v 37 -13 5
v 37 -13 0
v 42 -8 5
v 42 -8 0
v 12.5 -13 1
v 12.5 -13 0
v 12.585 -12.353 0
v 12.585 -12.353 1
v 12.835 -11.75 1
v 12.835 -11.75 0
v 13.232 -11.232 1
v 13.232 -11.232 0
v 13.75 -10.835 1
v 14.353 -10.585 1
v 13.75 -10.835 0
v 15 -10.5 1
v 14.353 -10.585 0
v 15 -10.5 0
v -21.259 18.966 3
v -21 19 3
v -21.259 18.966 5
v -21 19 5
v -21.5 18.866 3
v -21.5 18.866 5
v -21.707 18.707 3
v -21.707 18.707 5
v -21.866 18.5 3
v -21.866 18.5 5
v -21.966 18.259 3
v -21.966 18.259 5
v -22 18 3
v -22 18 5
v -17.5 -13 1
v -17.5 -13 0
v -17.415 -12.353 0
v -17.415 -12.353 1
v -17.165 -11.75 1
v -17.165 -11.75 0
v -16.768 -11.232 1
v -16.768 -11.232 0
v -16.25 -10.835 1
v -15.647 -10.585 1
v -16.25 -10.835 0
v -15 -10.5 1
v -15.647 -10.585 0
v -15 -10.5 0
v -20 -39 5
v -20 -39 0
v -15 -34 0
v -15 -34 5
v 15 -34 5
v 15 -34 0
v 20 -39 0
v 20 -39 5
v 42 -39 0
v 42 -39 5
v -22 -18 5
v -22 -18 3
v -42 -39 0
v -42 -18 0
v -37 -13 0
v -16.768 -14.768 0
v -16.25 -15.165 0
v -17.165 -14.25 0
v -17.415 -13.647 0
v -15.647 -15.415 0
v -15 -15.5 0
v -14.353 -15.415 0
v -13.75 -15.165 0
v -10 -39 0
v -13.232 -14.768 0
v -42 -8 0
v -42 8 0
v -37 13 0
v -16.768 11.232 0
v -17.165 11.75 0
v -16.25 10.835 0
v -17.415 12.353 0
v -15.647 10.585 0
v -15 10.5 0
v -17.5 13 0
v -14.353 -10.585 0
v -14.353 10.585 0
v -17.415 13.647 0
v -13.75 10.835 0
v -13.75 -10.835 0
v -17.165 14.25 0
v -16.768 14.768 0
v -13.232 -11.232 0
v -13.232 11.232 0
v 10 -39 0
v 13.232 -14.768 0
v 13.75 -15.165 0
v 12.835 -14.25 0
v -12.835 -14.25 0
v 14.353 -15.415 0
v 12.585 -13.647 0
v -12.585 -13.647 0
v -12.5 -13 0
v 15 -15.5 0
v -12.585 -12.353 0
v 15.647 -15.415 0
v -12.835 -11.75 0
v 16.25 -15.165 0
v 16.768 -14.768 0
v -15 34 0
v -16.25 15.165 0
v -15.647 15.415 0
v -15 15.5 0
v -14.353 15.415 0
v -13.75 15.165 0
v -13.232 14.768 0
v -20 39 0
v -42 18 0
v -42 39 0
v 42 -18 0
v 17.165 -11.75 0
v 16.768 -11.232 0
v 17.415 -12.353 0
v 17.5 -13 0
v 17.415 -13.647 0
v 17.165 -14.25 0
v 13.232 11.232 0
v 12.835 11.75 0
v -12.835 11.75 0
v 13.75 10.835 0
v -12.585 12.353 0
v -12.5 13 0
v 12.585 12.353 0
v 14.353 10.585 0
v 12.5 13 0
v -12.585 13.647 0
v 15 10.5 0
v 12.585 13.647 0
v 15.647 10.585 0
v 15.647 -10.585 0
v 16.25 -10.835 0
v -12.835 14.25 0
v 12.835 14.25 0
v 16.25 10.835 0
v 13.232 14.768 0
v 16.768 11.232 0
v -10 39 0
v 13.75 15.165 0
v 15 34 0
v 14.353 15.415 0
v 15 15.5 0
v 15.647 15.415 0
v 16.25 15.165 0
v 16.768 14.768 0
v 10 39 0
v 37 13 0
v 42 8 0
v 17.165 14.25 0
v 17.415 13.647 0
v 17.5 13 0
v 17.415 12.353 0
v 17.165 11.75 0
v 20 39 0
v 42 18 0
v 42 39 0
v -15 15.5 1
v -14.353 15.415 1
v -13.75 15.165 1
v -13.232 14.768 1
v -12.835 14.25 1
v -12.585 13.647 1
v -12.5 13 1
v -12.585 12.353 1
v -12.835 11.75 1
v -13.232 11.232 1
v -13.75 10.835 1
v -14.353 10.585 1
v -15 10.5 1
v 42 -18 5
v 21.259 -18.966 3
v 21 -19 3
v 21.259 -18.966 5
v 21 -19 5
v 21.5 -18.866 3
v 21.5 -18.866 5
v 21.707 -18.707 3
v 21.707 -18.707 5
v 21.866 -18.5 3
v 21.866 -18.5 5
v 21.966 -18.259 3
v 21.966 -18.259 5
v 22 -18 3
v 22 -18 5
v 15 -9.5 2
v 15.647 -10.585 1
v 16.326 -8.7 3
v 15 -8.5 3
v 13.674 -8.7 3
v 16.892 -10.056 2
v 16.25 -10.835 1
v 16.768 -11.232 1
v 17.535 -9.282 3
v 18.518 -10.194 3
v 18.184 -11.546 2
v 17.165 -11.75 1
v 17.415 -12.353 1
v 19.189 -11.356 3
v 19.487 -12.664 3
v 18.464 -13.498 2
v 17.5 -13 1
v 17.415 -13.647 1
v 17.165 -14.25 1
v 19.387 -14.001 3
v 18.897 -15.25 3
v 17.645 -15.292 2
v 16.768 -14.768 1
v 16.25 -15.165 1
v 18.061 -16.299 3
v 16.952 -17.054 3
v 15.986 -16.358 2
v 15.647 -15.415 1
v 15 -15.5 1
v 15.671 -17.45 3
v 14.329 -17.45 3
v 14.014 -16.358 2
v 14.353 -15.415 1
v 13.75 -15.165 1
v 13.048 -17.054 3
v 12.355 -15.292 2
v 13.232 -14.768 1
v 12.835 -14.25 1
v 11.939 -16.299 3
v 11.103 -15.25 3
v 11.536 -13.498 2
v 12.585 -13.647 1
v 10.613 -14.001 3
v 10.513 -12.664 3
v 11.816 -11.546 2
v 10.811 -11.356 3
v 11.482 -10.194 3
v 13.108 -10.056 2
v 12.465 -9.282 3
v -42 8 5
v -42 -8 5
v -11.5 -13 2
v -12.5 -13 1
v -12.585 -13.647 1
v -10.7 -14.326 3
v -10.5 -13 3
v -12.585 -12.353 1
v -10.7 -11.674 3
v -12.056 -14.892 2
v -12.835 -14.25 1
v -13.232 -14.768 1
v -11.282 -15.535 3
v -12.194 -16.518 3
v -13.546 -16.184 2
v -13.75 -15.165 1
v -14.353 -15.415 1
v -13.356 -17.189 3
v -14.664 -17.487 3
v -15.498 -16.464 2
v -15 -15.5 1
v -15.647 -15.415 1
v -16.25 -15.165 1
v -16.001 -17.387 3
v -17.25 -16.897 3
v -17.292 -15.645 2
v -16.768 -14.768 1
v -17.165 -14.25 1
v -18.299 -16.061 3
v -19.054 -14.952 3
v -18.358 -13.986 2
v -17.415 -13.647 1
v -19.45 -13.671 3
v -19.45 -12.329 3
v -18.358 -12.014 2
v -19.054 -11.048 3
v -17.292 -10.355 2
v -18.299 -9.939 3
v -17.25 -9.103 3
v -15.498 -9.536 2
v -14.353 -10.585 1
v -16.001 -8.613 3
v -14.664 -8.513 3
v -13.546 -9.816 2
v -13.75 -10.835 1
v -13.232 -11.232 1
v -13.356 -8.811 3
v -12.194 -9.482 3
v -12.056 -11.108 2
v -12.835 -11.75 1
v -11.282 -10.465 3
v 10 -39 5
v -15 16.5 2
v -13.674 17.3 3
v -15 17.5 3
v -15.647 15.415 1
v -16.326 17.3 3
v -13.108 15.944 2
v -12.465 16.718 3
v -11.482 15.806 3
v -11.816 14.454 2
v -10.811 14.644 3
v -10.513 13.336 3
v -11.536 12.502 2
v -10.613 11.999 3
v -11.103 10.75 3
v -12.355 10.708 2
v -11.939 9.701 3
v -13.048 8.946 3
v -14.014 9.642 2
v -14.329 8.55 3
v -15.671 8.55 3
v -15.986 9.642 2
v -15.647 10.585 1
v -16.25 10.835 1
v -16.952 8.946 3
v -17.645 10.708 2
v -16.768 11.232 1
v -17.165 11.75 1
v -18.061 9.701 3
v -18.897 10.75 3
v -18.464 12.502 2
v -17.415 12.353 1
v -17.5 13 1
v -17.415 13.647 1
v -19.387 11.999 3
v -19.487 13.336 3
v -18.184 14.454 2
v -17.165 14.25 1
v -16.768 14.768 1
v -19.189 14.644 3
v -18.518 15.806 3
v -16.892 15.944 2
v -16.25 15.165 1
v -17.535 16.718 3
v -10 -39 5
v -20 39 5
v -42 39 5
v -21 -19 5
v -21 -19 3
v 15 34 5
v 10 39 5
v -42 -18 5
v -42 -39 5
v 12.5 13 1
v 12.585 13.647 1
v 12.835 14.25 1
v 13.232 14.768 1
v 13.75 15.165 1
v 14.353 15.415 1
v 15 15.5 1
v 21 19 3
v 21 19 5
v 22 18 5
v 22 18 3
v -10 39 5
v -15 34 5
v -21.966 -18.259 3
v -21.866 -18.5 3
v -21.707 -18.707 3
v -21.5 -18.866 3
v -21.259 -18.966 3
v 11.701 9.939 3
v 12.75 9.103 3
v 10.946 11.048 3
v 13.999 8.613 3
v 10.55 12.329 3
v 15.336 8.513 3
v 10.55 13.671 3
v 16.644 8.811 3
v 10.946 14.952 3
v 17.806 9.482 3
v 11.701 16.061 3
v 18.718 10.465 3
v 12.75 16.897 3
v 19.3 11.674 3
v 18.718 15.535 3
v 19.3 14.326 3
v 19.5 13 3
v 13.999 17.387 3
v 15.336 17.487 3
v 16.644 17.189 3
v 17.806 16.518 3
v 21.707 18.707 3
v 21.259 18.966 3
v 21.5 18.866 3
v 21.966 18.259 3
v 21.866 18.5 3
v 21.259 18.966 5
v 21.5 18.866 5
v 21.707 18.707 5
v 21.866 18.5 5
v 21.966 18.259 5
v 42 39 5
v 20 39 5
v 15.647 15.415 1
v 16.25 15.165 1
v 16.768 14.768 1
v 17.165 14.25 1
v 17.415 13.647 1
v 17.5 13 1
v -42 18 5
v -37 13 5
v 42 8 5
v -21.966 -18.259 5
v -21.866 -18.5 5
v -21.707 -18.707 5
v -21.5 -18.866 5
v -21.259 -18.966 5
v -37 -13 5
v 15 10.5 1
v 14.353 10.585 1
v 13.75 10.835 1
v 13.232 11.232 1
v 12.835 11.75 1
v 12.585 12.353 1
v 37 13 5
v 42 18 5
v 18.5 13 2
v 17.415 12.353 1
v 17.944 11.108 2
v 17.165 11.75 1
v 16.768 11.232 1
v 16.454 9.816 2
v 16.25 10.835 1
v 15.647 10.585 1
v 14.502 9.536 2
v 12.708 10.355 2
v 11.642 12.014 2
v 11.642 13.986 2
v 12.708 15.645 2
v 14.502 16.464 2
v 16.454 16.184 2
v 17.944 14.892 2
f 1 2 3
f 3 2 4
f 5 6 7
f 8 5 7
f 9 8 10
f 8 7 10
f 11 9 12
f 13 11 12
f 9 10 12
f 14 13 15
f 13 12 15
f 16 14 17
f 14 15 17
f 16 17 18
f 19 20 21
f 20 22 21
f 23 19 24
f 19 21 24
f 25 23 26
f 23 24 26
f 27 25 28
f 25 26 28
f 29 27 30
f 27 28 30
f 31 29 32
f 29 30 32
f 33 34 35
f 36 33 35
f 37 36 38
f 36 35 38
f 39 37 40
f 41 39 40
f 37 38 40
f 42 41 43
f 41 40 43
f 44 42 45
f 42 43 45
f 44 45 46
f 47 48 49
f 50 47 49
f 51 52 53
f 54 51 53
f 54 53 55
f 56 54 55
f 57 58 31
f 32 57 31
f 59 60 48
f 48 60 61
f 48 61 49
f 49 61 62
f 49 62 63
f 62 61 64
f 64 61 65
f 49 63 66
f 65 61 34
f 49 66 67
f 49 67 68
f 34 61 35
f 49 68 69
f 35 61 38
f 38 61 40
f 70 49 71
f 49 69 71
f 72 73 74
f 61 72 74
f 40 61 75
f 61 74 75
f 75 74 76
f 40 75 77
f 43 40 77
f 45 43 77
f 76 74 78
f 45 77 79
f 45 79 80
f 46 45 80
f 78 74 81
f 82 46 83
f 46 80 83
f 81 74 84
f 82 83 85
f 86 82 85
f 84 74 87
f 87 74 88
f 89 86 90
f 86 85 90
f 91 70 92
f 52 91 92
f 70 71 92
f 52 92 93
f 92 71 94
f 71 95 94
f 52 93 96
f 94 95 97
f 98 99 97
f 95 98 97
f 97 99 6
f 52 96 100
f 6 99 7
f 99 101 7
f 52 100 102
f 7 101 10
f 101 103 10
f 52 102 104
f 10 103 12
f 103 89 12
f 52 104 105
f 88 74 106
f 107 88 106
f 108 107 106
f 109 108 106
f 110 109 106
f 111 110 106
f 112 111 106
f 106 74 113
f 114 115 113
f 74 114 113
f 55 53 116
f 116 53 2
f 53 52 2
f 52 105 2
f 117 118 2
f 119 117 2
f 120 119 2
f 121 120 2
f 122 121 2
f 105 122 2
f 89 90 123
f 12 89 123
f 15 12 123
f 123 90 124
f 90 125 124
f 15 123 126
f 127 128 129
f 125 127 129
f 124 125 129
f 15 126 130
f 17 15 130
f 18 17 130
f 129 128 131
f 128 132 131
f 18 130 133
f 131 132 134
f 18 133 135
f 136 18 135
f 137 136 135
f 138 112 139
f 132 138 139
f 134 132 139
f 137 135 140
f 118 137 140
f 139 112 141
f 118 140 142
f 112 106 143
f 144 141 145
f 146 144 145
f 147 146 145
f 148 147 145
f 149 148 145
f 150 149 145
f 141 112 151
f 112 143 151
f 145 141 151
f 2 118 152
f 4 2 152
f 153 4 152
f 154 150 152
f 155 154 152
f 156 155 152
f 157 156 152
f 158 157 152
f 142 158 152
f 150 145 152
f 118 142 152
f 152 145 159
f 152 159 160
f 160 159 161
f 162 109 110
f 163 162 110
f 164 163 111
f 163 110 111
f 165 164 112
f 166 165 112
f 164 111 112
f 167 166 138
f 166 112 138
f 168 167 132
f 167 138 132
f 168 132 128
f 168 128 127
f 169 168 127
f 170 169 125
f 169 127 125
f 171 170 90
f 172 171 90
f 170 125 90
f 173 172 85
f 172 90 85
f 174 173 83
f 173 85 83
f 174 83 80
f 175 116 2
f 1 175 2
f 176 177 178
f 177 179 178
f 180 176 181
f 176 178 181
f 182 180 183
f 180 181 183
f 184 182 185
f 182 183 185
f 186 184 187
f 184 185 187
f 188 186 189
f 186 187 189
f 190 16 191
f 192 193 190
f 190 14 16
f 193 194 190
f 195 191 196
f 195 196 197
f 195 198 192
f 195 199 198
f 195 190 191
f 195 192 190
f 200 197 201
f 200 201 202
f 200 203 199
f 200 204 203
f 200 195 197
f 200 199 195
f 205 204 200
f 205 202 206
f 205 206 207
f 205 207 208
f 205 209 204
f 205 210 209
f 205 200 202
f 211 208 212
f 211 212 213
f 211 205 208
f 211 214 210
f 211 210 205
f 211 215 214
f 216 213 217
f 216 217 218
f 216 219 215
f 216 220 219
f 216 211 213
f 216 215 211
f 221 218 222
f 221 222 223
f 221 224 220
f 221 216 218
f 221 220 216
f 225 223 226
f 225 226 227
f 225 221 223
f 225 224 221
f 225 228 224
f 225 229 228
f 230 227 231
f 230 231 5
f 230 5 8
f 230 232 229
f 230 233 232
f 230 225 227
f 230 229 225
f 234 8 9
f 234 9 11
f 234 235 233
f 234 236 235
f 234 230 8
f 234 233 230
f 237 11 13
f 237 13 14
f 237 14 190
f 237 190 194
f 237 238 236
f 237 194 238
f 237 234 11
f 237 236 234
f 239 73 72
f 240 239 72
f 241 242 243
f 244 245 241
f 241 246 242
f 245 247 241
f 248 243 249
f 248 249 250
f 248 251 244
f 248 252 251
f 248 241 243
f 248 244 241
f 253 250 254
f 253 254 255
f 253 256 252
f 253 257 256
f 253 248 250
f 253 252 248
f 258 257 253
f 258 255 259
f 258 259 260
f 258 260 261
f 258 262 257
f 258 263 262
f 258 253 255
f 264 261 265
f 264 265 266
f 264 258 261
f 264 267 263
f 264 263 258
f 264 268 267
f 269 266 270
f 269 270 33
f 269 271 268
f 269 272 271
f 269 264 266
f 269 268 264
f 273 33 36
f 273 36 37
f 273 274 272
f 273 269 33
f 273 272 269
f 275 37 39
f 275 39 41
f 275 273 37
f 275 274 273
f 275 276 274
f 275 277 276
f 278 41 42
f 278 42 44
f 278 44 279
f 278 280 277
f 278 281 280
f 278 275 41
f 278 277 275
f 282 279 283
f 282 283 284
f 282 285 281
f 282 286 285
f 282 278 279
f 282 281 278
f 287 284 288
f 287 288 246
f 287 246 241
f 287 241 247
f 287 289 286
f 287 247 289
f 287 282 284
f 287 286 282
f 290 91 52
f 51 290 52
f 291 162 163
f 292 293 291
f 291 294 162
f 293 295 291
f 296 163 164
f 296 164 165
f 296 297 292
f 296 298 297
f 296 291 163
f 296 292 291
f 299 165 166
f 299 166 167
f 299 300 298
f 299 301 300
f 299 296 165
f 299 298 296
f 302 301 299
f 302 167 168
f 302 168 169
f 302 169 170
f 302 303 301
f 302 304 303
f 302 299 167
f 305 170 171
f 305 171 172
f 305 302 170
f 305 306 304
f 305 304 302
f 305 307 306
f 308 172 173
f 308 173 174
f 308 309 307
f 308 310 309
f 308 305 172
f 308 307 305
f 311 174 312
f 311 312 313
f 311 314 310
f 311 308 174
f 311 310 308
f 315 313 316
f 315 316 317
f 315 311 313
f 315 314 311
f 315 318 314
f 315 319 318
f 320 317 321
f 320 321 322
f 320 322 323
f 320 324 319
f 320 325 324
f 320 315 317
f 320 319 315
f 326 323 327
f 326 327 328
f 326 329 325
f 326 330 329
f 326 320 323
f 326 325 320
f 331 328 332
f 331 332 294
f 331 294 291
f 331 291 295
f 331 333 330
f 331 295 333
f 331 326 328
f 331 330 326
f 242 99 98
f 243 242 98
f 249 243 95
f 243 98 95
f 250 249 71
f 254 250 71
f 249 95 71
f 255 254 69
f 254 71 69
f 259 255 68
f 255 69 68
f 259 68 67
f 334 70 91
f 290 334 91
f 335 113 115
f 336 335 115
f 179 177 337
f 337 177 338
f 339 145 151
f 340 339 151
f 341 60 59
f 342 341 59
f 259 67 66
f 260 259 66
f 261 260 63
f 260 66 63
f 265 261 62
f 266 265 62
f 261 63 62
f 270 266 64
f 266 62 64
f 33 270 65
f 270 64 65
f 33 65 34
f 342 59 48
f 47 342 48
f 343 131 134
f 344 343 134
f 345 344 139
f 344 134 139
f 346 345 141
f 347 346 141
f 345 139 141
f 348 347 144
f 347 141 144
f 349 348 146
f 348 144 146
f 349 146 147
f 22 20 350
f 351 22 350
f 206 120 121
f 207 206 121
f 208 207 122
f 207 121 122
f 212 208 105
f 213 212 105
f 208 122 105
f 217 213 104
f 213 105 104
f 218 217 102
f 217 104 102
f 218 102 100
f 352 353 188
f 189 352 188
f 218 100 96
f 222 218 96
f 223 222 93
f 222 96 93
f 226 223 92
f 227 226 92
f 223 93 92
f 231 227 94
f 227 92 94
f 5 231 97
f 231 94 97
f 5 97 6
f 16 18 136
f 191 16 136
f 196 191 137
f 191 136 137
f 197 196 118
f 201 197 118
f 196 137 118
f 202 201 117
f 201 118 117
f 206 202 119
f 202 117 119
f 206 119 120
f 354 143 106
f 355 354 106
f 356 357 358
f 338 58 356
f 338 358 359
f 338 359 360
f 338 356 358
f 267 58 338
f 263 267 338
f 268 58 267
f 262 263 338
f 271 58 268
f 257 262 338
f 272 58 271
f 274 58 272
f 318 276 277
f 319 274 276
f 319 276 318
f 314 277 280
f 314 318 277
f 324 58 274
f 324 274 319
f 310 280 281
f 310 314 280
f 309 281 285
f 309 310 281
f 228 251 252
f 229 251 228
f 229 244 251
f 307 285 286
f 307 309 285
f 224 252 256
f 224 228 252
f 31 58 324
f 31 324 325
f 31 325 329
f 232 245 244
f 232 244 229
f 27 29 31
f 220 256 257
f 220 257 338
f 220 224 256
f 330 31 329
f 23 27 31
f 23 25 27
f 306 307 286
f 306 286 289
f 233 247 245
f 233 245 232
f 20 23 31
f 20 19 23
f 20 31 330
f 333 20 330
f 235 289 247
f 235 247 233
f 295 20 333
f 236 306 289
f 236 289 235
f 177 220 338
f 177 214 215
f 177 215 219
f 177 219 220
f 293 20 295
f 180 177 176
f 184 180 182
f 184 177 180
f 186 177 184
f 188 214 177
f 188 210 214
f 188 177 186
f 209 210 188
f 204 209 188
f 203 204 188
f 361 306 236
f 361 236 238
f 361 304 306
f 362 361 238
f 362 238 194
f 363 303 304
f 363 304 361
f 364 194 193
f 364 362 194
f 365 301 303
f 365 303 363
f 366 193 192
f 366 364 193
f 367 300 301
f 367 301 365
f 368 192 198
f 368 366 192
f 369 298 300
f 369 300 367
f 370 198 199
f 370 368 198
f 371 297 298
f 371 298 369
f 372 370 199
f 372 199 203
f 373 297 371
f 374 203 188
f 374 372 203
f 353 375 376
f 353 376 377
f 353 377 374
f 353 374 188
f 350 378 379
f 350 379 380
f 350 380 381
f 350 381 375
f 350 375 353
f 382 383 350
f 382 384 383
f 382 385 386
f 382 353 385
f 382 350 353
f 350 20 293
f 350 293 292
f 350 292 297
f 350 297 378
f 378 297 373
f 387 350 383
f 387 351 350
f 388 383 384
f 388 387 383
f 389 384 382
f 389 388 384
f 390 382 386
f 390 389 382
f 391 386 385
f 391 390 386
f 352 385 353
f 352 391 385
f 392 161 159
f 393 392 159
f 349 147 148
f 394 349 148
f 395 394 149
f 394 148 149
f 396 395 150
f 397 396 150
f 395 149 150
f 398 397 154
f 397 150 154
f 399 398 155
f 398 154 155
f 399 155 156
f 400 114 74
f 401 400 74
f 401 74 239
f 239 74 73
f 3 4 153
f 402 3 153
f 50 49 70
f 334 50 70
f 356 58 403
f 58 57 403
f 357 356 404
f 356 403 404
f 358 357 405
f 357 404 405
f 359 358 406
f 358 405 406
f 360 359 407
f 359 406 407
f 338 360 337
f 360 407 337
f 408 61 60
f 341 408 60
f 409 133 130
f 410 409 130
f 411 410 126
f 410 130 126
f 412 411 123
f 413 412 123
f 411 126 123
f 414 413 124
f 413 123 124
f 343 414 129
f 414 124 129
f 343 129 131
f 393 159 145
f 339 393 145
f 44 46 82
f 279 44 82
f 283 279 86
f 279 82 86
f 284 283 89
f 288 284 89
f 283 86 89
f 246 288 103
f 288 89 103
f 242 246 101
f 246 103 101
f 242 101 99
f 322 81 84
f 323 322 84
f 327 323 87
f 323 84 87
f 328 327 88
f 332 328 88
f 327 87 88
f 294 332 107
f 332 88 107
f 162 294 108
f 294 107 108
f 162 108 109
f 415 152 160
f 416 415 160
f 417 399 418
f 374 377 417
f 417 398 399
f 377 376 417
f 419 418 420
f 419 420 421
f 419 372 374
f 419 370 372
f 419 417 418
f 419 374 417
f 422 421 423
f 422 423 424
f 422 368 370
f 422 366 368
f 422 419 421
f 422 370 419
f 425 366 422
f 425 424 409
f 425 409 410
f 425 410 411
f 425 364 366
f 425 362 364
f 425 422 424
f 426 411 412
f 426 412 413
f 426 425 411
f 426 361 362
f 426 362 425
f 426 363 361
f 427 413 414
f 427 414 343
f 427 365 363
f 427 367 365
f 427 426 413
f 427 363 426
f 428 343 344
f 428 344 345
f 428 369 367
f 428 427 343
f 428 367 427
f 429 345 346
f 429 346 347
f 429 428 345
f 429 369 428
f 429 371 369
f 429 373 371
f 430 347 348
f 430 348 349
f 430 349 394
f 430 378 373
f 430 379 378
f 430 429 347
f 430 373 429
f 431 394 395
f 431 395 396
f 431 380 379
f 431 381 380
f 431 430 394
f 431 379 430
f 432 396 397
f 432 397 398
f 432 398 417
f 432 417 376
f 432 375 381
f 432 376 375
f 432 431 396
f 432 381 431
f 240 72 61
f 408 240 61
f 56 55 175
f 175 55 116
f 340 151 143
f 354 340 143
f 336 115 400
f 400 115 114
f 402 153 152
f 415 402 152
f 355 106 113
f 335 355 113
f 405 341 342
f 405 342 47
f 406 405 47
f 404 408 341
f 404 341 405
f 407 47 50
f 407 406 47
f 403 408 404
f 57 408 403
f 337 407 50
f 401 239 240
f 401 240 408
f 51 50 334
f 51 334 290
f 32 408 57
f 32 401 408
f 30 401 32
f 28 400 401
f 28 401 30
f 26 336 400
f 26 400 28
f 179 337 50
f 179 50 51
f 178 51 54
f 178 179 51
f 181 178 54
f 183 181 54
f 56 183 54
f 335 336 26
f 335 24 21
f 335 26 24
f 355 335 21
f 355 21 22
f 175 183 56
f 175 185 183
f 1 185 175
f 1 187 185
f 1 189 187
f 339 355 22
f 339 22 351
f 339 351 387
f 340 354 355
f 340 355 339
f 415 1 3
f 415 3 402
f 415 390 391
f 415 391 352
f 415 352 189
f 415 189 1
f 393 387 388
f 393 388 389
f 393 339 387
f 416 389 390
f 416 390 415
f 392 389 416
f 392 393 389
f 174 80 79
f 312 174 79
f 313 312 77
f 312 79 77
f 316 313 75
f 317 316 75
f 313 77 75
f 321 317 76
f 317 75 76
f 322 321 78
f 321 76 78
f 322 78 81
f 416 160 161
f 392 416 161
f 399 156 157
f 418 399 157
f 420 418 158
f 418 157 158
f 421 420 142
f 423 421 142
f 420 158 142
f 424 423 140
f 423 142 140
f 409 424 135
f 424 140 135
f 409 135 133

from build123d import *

# Parameters (mm, degrees)
F1_DEPTH = 3
F4_DEPTH = 5
F5_R     = 1


# Not quite as in the source:
# - a fillet or chamfer that OpenCascade refuses, or shapes differently, is made with other operations: its cross-section is extruded or revolved along the edge and cut away or added
# - a feature of the source that left no trace in its solid (it failed there, or was rolled back) is left out


with BuildPart() as f1:
    # F0 (on Top) → F1 (new body)
    with BuildSketch(Plane.XY):
        Polygon((-22, -13), (-22, 13), (-37, 13), (-42, 8), (-42, -8), (-37, -13), align=None)
        with BuildLine():
            Line((-15, -10.5), (-15, 10.5))
            ThreePointArc((-15, 10.5), (-16.767766953, 11.232233047), (-17.5, 13))
            Line((-17.5, 13), (-22, 13))
            Line((-22, 13), (-22, -13))
            Line((-22, -13), (-17.5, -13))
            ThreePointArc((-17.5, -13), (-16.767766953, -11.232233047), (-15, -10.5))
        make_face()
        Polygon((37, 13), (22, 13), (22, -13), (37, -13), (42, -8), (42, 8), align=None)
        with BuildLine():
            Line((15, 19), (15, 15.5))
            ThreePointArc((15, 15.5), (16.767766953, 14.767766953), (17.5, 13))
            Line((17.5, 13), (22, 13))
            Line((22, 13), (22, 19))
            Line((22, 19), (15, 19))
        make_face()
        with BuildLine():
            Line((22, -13), (17.5, -13))
            ThreePointArc((17.5, -13), (16.767766953, -14.767766953), (15, -15.5))
            Line((15, -15.5), (15, -19))
            Line((15, -19), (22, -19))
            Line((22, -19), (22, -13))
        make_face()
        with BuildLine():
            Line((12.5, 13), (-12.5, 13))
            ThreePointArc((-12.5, 13), (-13.232233047, 11.232233047), (-15, 10.5))
            Line((-15, 10.5), (-15, -10.5))
            ThreePointArc((-15, -10.5), (-13.232233047, -11.232233047), (-12.5, -13))
            Line((-12.5, -13), (12.5, -13))
            ThreePointArc((12.5, -13), (13.232233047, -11.232233047), (15, -10.5))
            Line((15, -10.5), (15, 10.5))
            ThreePointArc((15, 10.5), (13.232233047, 11.232233047), (12.5, 13))
        make_face()
        with BuildLine():
            ThreePointArc((-15, -15.5), (-16.767766953, -14.767766953), (-17.5, -13))
            Line((-17.5, -13), (-22, -13))
            Line((-22, -13), (-22, -19))
            Line((-22, -19), (-15, -19))
            Line((-15, -19), (-15, -15.5))
        make_face()
        Polygon((-15, 34), (-15, 19), (15, 19), (15, 34), (10, 39), (-10, 39), align=None)
        Polygon((15, -19), (-15, -19), (-15, -34), (-10, -39), (10, -39), (15, -34), align=None)
        Polygon((-22, -19), (-22, -13), (-37, -13), (-42, -18), (-42, -39), (-20, -39), (-15, -34), (-15, -19), align=None)
        Polygon((-22, 19), (-15, 19), (-15, 34), (-20, 39), (-42, 39), (-42, 18), (-37, 13), (-22, 13), align=None)
        Polygon((15, 34), (15, 19), (22, 19), (22, 13), (37, 13), (42, 18), (42, 39), (20, 39), align=None)
        Polygon((37, -13), (22, -13), (22, -19), (15, -19), (15, -34), (20, -39), (42, -39), (42, -18), align=None)
        with BuildLine():
            ThreePointArc((-17.5, 13), (-16.767766953, 14.767766953), (-15, 15.5))
            Line((-15, 15.5), (-15, 19))
            Line((-15, 19), (-22, 19))
            Line((-22, 19), (-22, 13))
            Line((-22, 13), (-17.5, 13))
        make_face()
        with BuildLine():
            Line((12.5, -13), (-12.5, -13))
            ThreePointArc((-12.5, -13), (-13.232233047, -14.767766953), (-15, -15.5))
            Line((-15, -15.5), (-15, -19))
            Line((-15, -19), (15, -19))
            Line((15, -19), (15, -15.5))
            ThreePointArc((15, -15.5), (13.232233047, -14.767766953), (12.5, -13))
        make_face()
        with BuildLine():
            ThreePointArc((-15, 15.5), (-13.232233047, 14.767766953), (-12.5, 13))
            Line((-12.5, 13), (12.5, 13))
            ThreePointArc((12.5, 13), (13.232233047, 14.767766953), (15, 15.5))
            Line((15, 15.5), (15, 19))
            Line((15, 19), (-15, 19))
            Line((-15, 19), (-15, 15.5))
        make_face()
        with BuildLine():
            ThreePointArc((17.5, 13), (16.767766953, 11.232233047), (15, 10.5))
            Line((15, 10.5), (15, -10.5))
            ThreePointArc((15, -10.5), (16.767766953, -11.232233047), (17.5, -13))
            Line((17.5, -13), (22, -13))
            Line((22, -13), (22, 13))
            Line((22, 13), (17.5, 13))
        make_face()
    extrude(amount=F1_DEPTH)

    # F2: chamfer of 2 on 4 edges, made by hand

    # F2_s1 → F2_t2 (revolve, cut)
    with BuildSketch(Plane.XZ.offset(13)):
        Polygon((-12.5, 1), (-10.5, 3), (-12.5, 3), align=None)
    revolve(axis=Axis((-15, -13, 3), (0, 0, -1)), mode=Mode.SUBTRACT)

    # F2_s3 → F2_t4 (revolve, cut)
    with BuildSketch(Plane.YZ.offset(-15)):
        Polygon((15.5, 1), (17.5, 3), (15.5, 3), align=None)
    revolve(axis=Axis((-15, 13, 3), (0, 0, -1)), mode=Mode.SUBTRACT)

    # F2_s5 → F2_t6 (revolve, cut)
    with BuildSketch(Plane.XZ.offset(-13)):
        Polygon((17.5, 1), (19.5, 3), (17.5, 3), align=None)
    revolve(axis=Axis((15, 13, 3), (0, 0, -1)), mode=Mode.SUBTRACT)

    # F2_s7 → F2_t8 (revolve, cut)
    with BuildSketch(Plane.YZ.offset(15)):
        Polygon((-10.5, 1), (-8.5, 3), (-10.5, 3), align=None)
    revolve(axis=Axis((15, -13, 3), (0, 0, -1)), mode=Mode.SUBTRACT)

    # F0 (on Top) → F4 (join)
    with BuildSketch(Plane.XY):
        Polygon((-22, 19), (-15, 19), (-15, 34), (-20, 39), (-42, 39), (-42, 18), (-37, 13), (-22, 13), align=None)
        Polygon((-22, -13), (-22, 13), (-37, 13), (-42, 8), (-42, -8), (-37, -13), align=None)
        Polygon((-22, -19), (-22, -13), (-37, -13), (-42, -18), (-42, -39), (-20, -39), (-15, -34), (-15, -19), align=None)
        Polygon((15, -19), (-15, -19), (-15, -34), (-10, -39), (10, -39), (15, -34), align=None)
        Polygon((37, -13), (22, -13), (22, -19), (15, -19), (15, -34), (20, -39), (42, -39), (42, -18), align=None)
        Polygon((37, 13), (22, 13), (22, -13), (37, -13), (42, -8), (42, 8), align=None)
        Polygon((15, 34), (15, 19), (22, 19), (22, 13), (37, 13), (42, 18), (42, 39), (20, 39), align=None)
        Polygon((-15, 34), (-15, 19), (15, 19), (15, 34), (10, 39), (-10, 39), align=None)
    extrude(amount=F4_DEPTH)

    # F5
    f5_edges = [f1.edges().sort_by_distance(p)[0] for p in [
        (-22, 19, 4),
        (-22, -19, 4),
        (22, 19, 4),
        (22, -19, 4),
    ]]
    fillet(f5_edges, radius=F5_R)


solid = f1.part
